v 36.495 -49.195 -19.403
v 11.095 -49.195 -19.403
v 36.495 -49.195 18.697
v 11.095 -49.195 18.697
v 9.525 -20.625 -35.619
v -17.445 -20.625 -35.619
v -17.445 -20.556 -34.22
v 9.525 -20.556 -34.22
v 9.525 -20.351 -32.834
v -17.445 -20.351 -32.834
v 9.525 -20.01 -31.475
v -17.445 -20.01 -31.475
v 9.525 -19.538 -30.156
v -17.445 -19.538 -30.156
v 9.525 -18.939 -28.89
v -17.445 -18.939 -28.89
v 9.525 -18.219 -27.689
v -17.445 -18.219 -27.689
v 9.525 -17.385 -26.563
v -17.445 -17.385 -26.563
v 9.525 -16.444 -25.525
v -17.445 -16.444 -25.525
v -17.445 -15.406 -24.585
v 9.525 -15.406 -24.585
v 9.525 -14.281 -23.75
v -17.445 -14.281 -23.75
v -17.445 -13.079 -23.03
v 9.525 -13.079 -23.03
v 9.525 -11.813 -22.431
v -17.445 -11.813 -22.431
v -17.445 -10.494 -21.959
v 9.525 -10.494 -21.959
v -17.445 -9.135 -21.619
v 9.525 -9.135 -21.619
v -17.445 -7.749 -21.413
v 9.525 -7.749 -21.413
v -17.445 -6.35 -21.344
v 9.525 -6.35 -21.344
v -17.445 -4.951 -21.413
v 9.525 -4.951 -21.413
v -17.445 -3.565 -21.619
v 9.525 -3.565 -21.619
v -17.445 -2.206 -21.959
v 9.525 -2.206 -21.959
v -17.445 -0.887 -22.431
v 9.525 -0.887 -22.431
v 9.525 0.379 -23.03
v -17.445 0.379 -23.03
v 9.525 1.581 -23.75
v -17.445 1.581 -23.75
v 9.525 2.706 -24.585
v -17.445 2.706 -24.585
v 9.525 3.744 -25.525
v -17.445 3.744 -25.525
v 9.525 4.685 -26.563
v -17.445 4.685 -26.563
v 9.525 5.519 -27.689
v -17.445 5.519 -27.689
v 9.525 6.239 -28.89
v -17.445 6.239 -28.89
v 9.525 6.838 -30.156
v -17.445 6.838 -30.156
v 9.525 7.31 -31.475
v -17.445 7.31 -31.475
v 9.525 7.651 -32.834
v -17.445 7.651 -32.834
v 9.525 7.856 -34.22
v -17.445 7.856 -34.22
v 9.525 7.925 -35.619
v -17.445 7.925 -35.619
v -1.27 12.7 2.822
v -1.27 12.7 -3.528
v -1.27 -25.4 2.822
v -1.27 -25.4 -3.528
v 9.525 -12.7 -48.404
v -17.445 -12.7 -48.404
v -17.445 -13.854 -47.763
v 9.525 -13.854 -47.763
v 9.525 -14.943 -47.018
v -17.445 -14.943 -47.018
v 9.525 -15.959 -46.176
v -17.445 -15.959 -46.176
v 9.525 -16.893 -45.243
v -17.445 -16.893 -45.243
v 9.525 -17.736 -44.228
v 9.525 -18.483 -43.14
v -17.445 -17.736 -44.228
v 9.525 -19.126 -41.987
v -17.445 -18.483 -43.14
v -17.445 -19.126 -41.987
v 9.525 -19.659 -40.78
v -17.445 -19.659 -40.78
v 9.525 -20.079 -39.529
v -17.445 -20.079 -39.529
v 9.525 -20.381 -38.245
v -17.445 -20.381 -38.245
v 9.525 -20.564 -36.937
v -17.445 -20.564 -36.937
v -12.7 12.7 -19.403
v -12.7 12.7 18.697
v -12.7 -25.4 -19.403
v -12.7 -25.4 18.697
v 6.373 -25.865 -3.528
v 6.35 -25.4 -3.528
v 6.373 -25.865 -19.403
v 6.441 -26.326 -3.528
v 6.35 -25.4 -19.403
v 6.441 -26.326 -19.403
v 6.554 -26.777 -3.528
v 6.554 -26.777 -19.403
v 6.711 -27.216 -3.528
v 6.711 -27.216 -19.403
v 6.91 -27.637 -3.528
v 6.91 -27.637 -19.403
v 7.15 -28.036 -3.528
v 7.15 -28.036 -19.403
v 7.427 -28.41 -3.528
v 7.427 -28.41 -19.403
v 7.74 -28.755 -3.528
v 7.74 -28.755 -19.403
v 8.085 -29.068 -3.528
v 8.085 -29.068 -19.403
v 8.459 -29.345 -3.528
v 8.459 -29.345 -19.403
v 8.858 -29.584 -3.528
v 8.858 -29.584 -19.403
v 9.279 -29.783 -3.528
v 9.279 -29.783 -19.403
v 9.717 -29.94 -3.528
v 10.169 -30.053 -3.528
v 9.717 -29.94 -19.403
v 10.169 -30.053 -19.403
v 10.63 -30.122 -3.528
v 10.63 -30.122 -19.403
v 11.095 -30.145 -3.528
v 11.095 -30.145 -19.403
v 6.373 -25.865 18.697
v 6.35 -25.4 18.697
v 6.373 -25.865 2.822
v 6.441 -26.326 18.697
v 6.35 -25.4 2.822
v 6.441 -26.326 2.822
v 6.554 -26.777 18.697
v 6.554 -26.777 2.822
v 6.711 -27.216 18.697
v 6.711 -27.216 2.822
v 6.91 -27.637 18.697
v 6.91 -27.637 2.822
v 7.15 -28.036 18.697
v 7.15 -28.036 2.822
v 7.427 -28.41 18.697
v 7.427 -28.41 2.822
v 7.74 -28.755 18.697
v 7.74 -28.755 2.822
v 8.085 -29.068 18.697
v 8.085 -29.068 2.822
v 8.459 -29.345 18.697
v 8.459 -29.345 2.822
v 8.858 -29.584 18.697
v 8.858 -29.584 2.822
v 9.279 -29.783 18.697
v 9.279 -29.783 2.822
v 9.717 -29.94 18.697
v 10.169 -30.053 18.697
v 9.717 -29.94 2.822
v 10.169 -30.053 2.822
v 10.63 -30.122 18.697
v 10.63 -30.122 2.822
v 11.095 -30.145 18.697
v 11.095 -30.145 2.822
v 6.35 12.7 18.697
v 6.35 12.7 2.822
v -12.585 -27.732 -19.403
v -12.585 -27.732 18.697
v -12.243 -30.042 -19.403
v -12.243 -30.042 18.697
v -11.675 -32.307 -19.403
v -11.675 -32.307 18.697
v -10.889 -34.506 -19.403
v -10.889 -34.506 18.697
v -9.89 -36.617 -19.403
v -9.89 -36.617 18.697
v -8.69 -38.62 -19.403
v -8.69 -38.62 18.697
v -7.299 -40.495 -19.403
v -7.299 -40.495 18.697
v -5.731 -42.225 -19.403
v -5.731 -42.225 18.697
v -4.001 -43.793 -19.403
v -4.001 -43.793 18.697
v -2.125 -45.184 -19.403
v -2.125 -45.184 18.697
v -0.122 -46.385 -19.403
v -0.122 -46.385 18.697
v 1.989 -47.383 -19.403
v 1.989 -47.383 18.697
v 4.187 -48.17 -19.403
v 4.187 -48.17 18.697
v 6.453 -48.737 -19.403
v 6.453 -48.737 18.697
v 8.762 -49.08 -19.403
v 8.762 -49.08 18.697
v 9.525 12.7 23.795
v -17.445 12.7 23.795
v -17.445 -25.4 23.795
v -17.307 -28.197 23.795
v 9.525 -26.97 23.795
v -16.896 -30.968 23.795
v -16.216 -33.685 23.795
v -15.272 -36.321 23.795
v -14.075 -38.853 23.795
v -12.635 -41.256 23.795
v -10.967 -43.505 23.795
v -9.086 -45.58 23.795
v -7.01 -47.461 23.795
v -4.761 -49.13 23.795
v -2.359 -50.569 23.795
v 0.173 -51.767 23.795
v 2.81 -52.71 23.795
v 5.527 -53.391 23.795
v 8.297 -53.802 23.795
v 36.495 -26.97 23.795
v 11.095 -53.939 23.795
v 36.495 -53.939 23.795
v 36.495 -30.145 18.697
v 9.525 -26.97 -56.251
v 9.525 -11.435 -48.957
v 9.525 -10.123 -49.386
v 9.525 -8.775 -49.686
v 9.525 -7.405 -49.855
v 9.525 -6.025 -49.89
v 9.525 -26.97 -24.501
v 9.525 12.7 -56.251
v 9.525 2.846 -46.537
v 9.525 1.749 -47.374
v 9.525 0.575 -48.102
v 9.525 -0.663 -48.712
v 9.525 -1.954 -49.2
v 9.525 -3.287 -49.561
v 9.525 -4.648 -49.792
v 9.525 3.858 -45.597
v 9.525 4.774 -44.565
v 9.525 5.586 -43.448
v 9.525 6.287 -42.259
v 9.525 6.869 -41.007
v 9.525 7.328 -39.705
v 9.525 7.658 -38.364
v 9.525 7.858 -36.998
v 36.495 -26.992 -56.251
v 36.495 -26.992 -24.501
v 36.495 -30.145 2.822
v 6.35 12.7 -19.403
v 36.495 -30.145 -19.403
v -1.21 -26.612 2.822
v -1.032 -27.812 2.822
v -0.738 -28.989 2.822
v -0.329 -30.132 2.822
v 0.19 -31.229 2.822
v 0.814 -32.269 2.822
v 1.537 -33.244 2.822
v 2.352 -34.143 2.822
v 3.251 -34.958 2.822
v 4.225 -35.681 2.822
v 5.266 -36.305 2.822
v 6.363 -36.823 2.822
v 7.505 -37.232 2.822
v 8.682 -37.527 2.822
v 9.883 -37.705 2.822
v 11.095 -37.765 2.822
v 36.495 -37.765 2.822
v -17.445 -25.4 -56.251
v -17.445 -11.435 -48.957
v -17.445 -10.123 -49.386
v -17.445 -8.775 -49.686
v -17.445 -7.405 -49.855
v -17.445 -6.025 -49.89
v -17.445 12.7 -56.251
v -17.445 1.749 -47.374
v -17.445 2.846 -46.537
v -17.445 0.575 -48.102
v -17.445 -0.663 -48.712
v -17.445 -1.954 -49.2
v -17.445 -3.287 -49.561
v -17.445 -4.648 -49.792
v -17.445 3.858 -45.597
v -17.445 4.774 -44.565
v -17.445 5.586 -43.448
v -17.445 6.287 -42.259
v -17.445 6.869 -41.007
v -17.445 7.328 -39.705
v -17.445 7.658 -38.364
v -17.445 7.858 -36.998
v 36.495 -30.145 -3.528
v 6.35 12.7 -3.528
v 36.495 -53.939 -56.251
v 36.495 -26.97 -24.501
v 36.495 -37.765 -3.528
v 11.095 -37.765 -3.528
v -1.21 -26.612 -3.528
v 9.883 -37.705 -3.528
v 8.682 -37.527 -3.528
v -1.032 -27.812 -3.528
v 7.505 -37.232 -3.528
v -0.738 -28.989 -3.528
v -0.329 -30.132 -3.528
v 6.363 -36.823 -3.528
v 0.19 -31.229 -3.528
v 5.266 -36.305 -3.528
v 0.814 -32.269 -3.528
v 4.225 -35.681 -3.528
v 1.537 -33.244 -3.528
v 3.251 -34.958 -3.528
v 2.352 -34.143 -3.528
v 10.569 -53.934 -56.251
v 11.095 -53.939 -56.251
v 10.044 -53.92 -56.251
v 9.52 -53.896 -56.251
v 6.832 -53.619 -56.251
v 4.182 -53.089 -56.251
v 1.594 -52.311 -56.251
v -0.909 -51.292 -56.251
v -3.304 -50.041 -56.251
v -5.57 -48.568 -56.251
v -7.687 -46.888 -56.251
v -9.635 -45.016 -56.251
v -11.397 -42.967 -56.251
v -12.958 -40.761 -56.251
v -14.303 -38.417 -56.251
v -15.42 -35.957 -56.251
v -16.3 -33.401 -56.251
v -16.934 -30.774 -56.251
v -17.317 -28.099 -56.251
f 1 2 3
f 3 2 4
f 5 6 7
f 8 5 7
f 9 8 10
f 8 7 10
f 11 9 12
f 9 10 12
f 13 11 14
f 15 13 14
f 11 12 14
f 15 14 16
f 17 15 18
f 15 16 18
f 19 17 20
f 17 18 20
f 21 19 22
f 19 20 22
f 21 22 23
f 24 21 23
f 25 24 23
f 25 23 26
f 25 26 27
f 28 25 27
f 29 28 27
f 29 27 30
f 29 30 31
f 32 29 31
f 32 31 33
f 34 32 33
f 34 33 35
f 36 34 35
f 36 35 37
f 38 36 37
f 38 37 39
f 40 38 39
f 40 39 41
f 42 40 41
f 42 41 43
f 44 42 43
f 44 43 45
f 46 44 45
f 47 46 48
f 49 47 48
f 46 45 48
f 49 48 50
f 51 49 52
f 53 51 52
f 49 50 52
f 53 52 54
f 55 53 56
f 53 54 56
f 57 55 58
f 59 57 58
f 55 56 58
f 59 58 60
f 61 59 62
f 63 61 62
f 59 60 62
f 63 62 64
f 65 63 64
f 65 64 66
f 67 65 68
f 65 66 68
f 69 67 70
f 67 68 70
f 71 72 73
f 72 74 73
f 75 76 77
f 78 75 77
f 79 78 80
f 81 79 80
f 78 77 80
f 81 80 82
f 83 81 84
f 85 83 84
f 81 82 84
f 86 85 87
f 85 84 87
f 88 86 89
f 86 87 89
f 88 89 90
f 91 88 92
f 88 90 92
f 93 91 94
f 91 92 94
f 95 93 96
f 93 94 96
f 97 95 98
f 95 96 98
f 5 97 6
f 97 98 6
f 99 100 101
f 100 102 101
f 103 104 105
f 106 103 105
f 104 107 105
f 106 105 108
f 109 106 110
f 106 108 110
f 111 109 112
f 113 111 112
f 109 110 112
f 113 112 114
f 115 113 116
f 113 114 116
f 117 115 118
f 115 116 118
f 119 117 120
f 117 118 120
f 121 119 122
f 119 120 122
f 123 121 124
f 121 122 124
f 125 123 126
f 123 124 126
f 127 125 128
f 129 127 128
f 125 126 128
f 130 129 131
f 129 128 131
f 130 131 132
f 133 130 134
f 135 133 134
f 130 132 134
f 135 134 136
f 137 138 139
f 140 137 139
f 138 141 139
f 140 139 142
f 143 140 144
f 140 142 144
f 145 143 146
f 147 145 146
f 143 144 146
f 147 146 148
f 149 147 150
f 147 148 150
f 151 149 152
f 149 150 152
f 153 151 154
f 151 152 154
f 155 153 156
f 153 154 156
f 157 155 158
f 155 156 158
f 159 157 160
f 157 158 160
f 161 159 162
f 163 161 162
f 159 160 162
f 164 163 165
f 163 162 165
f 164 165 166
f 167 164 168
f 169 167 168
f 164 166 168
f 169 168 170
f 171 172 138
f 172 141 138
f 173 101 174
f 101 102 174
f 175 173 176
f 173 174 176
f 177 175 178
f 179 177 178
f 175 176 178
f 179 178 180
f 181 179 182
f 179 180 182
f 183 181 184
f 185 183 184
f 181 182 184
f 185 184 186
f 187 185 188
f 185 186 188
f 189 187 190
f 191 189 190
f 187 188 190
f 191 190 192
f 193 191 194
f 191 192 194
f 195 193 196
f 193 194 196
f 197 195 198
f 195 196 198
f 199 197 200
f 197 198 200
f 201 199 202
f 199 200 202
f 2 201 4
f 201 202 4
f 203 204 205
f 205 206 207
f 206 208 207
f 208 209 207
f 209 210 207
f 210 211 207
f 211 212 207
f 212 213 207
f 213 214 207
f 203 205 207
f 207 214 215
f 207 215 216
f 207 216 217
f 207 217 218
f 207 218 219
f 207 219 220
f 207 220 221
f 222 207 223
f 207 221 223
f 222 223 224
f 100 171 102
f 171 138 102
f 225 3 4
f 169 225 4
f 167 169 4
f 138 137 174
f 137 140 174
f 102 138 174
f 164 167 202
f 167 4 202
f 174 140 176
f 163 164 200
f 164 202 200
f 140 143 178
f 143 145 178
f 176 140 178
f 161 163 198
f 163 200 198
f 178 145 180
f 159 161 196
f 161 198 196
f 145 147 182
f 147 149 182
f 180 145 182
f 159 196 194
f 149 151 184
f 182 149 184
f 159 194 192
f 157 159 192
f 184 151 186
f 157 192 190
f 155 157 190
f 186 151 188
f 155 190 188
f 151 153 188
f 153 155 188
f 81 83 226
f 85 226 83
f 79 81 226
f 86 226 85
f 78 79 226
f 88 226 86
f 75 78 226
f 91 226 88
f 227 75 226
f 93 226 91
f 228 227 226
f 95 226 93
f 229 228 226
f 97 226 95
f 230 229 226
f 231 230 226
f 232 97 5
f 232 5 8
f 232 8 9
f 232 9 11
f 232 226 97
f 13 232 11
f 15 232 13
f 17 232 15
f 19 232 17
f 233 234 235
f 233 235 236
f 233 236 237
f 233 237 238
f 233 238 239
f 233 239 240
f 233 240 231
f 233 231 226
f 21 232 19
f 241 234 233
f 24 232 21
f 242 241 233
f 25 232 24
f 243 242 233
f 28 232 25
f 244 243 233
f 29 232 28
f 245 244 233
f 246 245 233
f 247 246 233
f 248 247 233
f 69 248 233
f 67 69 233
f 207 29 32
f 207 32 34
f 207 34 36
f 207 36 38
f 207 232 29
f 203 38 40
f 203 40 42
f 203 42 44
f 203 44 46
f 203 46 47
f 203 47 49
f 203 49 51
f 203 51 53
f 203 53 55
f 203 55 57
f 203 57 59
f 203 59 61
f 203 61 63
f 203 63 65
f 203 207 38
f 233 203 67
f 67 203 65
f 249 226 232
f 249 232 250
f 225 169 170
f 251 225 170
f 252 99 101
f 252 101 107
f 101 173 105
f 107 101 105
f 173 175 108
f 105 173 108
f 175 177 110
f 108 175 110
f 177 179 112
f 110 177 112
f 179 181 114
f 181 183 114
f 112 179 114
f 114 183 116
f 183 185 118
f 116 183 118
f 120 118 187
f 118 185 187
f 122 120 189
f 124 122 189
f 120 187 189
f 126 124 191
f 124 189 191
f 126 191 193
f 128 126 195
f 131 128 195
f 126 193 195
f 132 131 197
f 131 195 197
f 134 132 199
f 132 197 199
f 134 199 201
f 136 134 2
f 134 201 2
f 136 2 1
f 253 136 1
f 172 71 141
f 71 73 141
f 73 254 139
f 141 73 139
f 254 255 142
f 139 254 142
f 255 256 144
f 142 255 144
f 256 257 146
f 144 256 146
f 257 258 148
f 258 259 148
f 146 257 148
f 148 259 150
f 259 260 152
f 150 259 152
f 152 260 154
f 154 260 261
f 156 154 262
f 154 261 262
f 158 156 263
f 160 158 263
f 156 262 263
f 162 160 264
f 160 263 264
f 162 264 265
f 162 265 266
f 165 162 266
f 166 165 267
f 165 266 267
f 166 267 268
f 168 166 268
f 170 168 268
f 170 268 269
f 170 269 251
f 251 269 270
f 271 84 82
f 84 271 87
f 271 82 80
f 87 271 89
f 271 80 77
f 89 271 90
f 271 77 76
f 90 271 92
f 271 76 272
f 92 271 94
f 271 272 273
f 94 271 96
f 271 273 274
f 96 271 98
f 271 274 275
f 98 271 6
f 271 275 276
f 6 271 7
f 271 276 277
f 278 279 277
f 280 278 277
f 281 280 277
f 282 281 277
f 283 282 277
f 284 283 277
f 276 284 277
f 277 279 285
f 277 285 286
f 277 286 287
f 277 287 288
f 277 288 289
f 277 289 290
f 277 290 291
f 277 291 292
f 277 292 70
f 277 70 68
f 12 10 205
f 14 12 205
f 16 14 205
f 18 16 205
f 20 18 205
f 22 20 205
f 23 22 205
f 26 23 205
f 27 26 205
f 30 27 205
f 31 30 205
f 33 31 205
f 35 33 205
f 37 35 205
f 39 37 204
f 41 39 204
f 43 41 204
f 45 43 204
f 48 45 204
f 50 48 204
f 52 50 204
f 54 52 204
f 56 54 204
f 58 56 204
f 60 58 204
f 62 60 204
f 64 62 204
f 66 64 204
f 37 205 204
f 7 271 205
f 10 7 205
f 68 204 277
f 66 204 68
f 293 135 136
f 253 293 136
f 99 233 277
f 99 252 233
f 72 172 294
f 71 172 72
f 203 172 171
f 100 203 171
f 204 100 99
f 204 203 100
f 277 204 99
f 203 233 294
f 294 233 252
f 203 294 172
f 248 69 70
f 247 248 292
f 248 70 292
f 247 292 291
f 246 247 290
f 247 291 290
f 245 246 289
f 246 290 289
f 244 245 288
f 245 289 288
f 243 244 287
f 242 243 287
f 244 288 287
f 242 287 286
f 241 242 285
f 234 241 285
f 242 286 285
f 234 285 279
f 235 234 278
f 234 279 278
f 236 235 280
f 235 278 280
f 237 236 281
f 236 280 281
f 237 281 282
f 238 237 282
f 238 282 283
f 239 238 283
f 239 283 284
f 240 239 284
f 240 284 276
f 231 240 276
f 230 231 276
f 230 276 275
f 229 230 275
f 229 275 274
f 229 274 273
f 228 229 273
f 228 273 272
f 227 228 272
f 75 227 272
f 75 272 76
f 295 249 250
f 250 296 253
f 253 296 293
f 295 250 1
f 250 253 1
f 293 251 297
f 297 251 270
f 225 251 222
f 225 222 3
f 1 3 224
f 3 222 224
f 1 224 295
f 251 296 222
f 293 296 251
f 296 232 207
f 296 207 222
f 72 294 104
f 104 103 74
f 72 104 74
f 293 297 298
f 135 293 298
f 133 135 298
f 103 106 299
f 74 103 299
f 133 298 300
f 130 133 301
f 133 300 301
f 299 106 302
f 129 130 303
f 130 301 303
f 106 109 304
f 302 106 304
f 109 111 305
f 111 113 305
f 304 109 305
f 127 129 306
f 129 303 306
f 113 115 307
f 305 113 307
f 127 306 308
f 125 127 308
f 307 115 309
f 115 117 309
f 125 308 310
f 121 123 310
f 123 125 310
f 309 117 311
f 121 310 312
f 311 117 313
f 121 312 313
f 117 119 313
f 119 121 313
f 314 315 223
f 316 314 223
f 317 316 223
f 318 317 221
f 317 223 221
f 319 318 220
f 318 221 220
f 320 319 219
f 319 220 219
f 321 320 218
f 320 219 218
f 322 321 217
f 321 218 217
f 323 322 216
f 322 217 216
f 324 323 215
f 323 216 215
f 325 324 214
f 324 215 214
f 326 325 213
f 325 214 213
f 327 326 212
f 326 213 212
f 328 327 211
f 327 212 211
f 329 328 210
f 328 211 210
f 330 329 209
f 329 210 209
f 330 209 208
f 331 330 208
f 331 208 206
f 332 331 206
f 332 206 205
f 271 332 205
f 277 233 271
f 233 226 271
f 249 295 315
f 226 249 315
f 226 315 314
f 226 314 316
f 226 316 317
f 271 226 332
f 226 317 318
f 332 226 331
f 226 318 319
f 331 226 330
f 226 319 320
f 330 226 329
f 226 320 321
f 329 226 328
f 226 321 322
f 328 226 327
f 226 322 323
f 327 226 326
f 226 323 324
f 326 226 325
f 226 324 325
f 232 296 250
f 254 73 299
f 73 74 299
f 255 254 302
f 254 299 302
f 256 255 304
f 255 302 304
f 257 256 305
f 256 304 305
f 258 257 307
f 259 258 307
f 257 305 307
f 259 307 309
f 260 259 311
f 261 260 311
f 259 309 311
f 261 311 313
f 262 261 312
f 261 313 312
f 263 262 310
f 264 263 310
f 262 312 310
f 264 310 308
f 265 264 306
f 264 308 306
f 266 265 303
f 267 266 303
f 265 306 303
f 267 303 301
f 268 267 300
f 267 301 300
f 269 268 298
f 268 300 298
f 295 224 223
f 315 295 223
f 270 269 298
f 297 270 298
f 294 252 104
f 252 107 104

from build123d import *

# Parameters (mm, degrees)
F0_W      = 28.5392315894
F0_H      = 48.2956362042
F1_DEPTH  = 25.4
F1_FACE_W = 28.5392315894
F1_FACE_H = 48.2956362042
F2_ANGLE  = 90
F3_DEPTH  = 25.4
F4_W      = 26.9696157947
F4_H      = 26.9696157947
F5_DEPTH  = 50.14334
F8_W      = 6.35
F8_H      = 25.4
F9_DEPTH  = 25.4
F10_R     = 2.5796875
F11_DEPTH = 50.8
F13_DEPTH = 12.7
F15_DEPTH = 6.35
F16_DEPTH = 50.8


with BuildPart() as f1:
    # F0 (on Front) → F1 (new body)
    with BuildSketch(Plane.XZ):
        with Locations((-3.175, -0.3527777778)):
            Rectangle(F0_W, F0_H)
        Polygon((-12.7, -19.4027777778), (-12.7, 18.6972222222), (6.35, 18.6972222222), (6.35, 2.8222222222), (-1.27, 2.8222222222), (-1.27, -3.5277777778), (6.35, -3.5277777778), (6.35, -19.4027777778), align=None, mode=Mode.SUBTRACT)
    extrude(amount=F1_DEPTH)

    # F1_face (on face) → F2 (revolve)
    with BuildSketch(Plane(origin=(-2.7804632911, -25.4, -0.3527777778), x_dir=(1, 0, 0), z_dir=(0, -1, 0))):
        with Locations((-0.3945367089, 0)):
            Rectangle(F1_FACE_W, F1_FACE_H)
        Polygon((9.1304632911, -19.05), (-9.9195367089, -19.05), (-9.9195367089, 19.05), (9.1304632911, 19.05), (9.1304632911, 3.175), (1.5104632911, 3.175), (1.5104632911, -3.175), (9.1304632911, -3.175), align=None, mode=Mode.SUBTRACT)
    revolve(axis=Axis((11.0946157947, -25.4, -0.3527777778), (0, 0, 1)), revolution_arc=F2_ANGLE)

    # F3 (add): a face of the model
    f3_faces = [f1.faces().sort_by_distance(p)[0] for p in [
        (11.0946157947, -22.3630131274, -0.3527777778),
    ]]
    extrude(f3_faces, amount=F3_DEPTH)

    # F4 (on face) → F5 (cut, symmetric)
    with BuildSketch(Plane(origin=(0, 0, -24.5005958799), x_dir=(1, 0, 0), z_dir=(0, 0, -1))):
        with Locations((23.0098078974, 13.4848078974)):
            Rectangle(F4_W, F4_H)
    extrude(amount=F5_DEPTH, both=True, mode=Mode.SUBTRACT)

    # F8 (on face) + F6 (on face) → F9 (join)
    with BuildSketch(Plane(origin=(0, 0, -24.5005958799), x_dir=(1, 0, 0), z_dir=(0, 0, -1))):
        with Locations((-14.2696157947, 12.7)):
            Rectangle(F8_W, F8_H)
        with Locations((6.35, 12.7)):
            Rectangle(F8_W, F8_H)
    with BuildSketch(Plane(origin=(0, 0, -24.5005958799), x_dir=(1, 0, 0), z_dir=(0, 0, -1))):
        with BuildLine():
            Line((9.525, 0), (9.525, 26.9696157947))
            Line((9.525, 26.9696157947), (9.5198247534, 33.3196136858))
            Line((9.5198247534, 33.3196136858), (36.4946157947, 33.3415981335))
            Line((36.4946157947, 33.3415981335), (36.4946157947, 47.5892315894))
            Line((36.4946157947, 47.5892315894), (9.5198157947, 47.5892315894))
            Line((9.5198157947, 47.5892315894), (9.5198157947, 53.8957495896))
            ThreePointArc((9.5198157947, 53.8957495896), (-9.6349683982, 45.0156080432), (-17.4446157947, 25.4))
            Line((-17.4446157947, 25.4), (-17.4446157947, 0))
            Line((-17.4446157947, 0), (9.525, 0))
        make_face()
        with BuildLine():
            Line((9.5198157947, 47.5892315894), (36.4946157947, 47.5892315894))
            Line((36.4946157947, 47.5892315894), (36.4946157947, 53.9392315894))
            Line((36.4946157947, 53.9392315894), (11.0946157947, 53.9392315894))
            ThreePointArc((11.0946157947, 53.9392315894), (10.3069157052, 53.9283590184), (9.5198157947, 53.8957495896))
            Line((9.5198157947, 53.8957495896), (9.5198157947, 47.5892315894))
        make_face()
        Polygon((9.5198247534, 33.3196136858), (9.525, 26.9696157947), (36.4946157947, 26.9915960246), (36.4946157947, 33.3415981335), align=None)
    extrude(amount=F9_DEPTH)

    # F10 (on face) → F11 (cut)
    with BuildSketch(Plane(origin=(-17.4446157947, 0, 0), x_dir=(0, -1, 0), z_dir=(-1, 0, 0))):
        with Locations((12.7, -35.9203596757)):
            Circle(F10_R)
    extrude(amount=-F11_DEPTH, mode=Mode.SUBTRACT)

    # F12 (on face) → F13 (join)
    with BuildSketch(Plane(origin=(0, 0, 0), x_dir=(-1, 0, 0), z_dir=(0, 1, 0))):
        Polygon((-9.525, 23.7950403243), (-9.525, -0.3527777778), (-9.525, -49.9005958799), (17.4446157947, -49.9005958799), (17.4446157947, 23.7950403243), align=None)
        Polygon((1.27, -3.5277777778), (1.27, -0.3527777778), (1.27, 2.8222222222), (-6.35, 2.8222222222), (-6.35, 18.6972222222), (12.7, 18.6972222222), (12.7, -19.4027777778), (-6.35, -19.4027777778), (-6.35, -3.5277777778), align=None, mode=Mode.SUBTRACT)
    extrude(amount=F13_DEPTH)

    # F15 (add): a face of the model
    f15_faces = [f1.faces().sort_by_distance(p)[0] for p in [
        (4.9144212495, -24.754718946, -49.9005958799),
    ]]
    extrude(f15_faces, amount=F15_DEPTH)

    # F14 (on face) → F16 (cut)
    with BuildSketch(Plane(origin=(-17.4446157947, 0, 0), x_dir=(0, -1, 0), z_dir=(-1, 0, 0))):
        with BuildLine():
            Line((-7.9248, -35.6191955507), (10.1379524268, -35.6191955507))
            ThreePointArc((10.1379524268, -35.6191955507), (12.7, -33.3406721757), (15.2620475732, -35.6191955507))
            Line((15.2620475732, -35.6191955507), (20.6248, -35.6191955507))
            ThreePointArc((20.6248, -35.6191955507), (6.35, -21.3443955507), (-7.9248, -35.6191955507))
        make_face()
        with BuildLine():
            Line((12.7, -48.4038510032), (12.7, -38.5000471757))
            ThreePointArc((12.7, -38.5000471757), (10.772346384, -37.634693113), (10.1379524268, -35.6191955507))
            Line((10.1379524268, -35.6191955507), (-7.9248, -35.6191955507))
            ThreePointArc((-7.9248, -35.6191955507), (-1.1708023189, -47.7521031791), (12.7, -48.4038510032))
        make_face()
        with BuildLine():
            ThreePointArc((15.2796875, -35.9203596757), (14.5241145246, -37.7444742003), (12.7, -38.5000471757))
            Line((12.7, -38.5000471757), (12.7, -48.4038510032))
            ThreePointArc((12.7, -48.4038510032), (18.4829076284, -43.1399978696), (20.6248, -35.6191955507))
            Line((20.6248, -35.6191955507), (15.2620475732, -35.6191955507))
            ThreePointArc((15.2620475732, -35.6191955507), (15.2752737424, -35.7695195308), (15.2796875, -35.9203596757))
        make_face()
    extrude(amount=-F16_DEPTH, mode=Mode.SUBTRACT)


solid = f1.part
